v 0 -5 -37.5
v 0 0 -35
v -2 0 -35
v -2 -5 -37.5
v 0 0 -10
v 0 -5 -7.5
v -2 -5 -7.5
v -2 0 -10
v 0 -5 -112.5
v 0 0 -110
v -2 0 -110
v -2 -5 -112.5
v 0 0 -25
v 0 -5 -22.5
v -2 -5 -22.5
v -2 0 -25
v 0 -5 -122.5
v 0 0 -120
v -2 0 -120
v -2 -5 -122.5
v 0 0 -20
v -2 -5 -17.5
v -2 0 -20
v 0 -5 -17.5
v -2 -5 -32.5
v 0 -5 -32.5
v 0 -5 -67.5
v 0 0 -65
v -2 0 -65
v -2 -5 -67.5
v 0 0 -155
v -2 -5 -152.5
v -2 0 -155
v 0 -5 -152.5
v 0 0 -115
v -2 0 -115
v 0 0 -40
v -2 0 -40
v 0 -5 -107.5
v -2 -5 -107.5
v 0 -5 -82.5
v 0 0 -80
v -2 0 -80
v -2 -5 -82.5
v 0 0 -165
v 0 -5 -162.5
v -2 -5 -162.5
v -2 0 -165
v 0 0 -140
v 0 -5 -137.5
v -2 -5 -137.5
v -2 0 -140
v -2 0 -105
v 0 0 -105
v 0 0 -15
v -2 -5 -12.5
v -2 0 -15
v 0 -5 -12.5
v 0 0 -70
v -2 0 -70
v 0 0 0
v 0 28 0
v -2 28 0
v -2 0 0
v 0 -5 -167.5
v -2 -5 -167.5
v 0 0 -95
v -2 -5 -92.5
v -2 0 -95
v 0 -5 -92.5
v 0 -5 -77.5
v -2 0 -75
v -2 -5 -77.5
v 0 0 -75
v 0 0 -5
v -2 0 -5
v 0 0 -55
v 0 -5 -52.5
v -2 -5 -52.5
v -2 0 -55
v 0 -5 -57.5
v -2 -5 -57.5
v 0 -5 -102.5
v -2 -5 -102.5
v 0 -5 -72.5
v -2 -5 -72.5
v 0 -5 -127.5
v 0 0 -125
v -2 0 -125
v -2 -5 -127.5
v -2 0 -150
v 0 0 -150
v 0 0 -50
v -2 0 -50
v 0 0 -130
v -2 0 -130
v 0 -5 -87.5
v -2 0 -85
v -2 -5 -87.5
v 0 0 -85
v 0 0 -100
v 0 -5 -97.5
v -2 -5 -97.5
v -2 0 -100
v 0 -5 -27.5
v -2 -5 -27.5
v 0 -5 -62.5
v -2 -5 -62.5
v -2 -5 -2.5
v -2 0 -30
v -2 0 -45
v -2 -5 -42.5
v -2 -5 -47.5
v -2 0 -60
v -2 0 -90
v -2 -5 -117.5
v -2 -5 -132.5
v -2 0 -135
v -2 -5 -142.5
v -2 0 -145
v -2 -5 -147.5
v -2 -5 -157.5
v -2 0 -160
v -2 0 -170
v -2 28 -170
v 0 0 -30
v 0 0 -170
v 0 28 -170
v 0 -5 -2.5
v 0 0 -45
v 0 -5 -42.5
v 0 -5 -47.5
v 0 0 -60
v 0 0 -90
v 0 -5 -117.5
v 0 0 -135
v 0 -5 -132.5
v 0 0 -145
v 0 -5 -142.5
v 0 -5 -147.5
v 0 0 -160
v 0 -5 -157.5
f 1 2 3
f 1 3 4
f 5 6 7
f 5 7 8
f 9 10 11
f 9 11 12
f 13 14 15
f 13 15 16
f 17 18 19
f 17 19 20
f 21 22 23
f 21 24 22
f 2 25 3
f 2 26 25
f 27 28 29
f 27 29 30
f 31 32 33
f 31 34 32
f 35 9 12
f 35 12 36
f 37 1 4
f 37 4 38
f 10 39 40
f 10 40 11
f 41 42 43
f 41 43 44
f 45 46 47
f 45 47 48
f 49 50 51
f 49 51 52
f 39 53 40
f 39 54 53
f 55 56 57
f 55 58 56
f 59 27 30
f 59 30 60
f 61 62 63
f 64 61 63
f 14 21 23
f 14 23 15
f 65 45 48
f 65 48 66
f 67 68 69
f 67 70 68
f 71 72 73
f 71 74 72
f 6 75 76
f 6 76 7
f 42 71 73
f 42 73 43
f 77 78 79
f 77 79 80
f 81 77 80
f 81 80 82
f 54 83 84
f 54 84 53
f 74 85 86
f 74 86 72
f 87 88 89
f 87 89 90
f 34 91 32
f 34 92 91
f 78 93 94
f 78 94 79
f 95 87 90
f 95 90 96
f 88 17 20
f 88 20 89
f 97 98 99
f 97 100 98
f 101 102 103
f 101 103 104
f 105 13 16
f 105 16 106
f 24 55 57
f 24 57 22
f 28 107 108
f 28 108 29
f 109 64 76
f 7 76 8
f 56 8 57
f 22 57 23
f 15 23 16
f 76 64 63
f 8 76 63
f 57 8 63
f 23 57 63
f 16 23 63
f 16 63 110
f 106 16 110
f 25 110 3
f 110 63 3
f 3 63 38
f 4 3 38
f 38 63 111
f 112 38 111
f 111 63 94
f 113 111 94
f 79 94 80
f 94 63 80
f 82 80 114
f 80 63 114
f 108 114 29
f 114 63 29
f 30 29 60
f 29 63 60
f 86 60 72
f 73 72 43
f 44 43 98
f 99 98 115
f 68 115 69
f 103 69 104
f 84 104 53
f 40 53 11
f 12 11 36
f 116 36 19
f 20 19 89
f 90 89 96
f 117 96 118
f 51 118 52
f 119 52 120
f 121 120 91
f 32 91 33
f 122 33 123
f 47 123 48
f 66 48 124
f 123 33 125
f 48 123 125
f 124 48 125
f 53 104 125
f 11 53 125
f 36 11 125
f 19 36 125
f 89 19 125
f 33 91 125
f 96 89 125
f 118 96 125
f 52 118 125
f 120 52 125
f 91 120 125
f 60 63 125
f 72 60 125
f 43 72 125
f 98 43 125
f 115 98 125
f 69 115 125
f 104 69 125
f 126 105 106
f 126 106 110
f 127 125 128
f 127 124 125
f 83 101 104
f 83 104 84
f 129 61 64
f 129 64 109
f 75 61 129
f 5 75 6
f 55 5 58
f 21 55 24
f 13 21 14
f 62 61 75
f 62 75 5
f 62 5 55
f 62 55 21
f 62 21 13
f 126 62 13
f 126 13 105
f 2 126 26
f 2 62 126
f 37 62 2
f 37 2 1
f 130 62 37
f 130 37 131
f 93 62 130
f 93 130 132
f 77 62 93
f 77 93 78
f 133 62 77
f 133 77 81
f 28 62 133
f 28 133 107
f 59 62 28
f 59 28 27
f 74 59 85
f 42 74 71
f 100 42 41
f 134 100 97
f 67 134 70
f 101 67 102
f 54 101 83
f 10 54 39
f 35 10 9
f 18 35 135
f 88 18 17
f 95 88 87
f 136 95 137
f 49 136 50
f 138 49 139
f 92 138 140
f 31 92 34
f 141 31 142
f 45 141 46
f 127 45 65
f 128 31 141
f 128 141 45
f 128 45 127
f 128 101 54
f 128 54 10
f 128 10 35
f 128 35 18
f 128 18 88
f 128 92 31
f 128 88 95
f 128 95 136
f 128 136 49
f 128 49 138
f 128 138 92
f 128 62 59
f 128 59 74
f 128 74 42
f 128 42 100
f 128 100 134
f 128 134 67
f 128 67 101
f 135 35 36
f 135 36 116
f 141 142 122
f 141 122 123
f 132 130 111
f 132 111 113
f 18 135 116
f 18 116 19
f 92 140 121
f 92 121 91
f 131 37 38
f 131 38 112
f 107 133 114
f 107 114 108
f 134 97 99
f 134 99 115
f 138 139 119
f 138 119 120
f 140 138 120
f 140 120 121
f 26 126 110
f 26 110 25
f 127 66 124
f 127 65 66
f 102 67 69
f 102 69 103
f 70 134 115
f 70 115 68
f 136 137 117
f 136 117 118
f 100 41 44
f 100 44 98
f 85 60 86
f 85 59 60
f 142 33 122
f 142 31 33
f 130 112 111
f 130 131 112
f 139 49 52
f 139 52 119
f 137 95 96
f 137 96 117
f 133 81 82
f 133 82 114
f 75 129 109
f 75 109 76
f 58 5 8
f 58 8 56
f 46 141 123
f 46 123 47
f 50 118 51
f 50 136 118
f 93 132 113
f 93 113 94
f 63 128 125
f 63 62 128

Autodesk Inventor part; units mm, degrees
ref_plane "YZ Plane" through (0, 0, 0) normal (1, 0, 0) x (0, 1, 0)
ref_plane "XZ Plane" through (0, 0, 0) normal (0, 1, 0) x (-1, 0, 0)
sketch "Sketch1" plane through (0, 0, 0) normal (0, 1, 0) x (-1, 0, 0)
  line L0 (0, 0) -> (2, 0)
  line L1 (2, 0) -> (2, -170)
  line L2 (2, -170) -> (0, -170)
  line L3 (0, -170) -> (0, 0)
  dimension "d0" = 2
  dimension "d1" = 170
extrude "Extrusion1" add sketch "Sketch1" along normal blind 28
ref_plane "Work Plane1" through (0, -5, 0) normal (0, -1, 0) x (1, 0, 0)
sketch "Sketch6" plane through (0, 0, 0) normal (1, 0, 0) x (0, 0, -1)
  line L0 (170, 0) -> (0, 0) projected
  line L1 (0, 0) -> (2.5, -5)
  line L2 (2.5, -5) -> (5, 0)
  line L3 (204, -5) -> (-34, -5) projected
  dimension "d5" = 2.5
  dimension "d6" = 2.5
  dimension "d7" = 0
extrude "Extrusion2" add sketch "Sketch6" against normal blind 2
pattern_linear "Rectangular Pattern1" count 34 spacing 5 along (0, 0, -1) of "Extrusion2"
properties part number "Blade" material "UHMW, White"
